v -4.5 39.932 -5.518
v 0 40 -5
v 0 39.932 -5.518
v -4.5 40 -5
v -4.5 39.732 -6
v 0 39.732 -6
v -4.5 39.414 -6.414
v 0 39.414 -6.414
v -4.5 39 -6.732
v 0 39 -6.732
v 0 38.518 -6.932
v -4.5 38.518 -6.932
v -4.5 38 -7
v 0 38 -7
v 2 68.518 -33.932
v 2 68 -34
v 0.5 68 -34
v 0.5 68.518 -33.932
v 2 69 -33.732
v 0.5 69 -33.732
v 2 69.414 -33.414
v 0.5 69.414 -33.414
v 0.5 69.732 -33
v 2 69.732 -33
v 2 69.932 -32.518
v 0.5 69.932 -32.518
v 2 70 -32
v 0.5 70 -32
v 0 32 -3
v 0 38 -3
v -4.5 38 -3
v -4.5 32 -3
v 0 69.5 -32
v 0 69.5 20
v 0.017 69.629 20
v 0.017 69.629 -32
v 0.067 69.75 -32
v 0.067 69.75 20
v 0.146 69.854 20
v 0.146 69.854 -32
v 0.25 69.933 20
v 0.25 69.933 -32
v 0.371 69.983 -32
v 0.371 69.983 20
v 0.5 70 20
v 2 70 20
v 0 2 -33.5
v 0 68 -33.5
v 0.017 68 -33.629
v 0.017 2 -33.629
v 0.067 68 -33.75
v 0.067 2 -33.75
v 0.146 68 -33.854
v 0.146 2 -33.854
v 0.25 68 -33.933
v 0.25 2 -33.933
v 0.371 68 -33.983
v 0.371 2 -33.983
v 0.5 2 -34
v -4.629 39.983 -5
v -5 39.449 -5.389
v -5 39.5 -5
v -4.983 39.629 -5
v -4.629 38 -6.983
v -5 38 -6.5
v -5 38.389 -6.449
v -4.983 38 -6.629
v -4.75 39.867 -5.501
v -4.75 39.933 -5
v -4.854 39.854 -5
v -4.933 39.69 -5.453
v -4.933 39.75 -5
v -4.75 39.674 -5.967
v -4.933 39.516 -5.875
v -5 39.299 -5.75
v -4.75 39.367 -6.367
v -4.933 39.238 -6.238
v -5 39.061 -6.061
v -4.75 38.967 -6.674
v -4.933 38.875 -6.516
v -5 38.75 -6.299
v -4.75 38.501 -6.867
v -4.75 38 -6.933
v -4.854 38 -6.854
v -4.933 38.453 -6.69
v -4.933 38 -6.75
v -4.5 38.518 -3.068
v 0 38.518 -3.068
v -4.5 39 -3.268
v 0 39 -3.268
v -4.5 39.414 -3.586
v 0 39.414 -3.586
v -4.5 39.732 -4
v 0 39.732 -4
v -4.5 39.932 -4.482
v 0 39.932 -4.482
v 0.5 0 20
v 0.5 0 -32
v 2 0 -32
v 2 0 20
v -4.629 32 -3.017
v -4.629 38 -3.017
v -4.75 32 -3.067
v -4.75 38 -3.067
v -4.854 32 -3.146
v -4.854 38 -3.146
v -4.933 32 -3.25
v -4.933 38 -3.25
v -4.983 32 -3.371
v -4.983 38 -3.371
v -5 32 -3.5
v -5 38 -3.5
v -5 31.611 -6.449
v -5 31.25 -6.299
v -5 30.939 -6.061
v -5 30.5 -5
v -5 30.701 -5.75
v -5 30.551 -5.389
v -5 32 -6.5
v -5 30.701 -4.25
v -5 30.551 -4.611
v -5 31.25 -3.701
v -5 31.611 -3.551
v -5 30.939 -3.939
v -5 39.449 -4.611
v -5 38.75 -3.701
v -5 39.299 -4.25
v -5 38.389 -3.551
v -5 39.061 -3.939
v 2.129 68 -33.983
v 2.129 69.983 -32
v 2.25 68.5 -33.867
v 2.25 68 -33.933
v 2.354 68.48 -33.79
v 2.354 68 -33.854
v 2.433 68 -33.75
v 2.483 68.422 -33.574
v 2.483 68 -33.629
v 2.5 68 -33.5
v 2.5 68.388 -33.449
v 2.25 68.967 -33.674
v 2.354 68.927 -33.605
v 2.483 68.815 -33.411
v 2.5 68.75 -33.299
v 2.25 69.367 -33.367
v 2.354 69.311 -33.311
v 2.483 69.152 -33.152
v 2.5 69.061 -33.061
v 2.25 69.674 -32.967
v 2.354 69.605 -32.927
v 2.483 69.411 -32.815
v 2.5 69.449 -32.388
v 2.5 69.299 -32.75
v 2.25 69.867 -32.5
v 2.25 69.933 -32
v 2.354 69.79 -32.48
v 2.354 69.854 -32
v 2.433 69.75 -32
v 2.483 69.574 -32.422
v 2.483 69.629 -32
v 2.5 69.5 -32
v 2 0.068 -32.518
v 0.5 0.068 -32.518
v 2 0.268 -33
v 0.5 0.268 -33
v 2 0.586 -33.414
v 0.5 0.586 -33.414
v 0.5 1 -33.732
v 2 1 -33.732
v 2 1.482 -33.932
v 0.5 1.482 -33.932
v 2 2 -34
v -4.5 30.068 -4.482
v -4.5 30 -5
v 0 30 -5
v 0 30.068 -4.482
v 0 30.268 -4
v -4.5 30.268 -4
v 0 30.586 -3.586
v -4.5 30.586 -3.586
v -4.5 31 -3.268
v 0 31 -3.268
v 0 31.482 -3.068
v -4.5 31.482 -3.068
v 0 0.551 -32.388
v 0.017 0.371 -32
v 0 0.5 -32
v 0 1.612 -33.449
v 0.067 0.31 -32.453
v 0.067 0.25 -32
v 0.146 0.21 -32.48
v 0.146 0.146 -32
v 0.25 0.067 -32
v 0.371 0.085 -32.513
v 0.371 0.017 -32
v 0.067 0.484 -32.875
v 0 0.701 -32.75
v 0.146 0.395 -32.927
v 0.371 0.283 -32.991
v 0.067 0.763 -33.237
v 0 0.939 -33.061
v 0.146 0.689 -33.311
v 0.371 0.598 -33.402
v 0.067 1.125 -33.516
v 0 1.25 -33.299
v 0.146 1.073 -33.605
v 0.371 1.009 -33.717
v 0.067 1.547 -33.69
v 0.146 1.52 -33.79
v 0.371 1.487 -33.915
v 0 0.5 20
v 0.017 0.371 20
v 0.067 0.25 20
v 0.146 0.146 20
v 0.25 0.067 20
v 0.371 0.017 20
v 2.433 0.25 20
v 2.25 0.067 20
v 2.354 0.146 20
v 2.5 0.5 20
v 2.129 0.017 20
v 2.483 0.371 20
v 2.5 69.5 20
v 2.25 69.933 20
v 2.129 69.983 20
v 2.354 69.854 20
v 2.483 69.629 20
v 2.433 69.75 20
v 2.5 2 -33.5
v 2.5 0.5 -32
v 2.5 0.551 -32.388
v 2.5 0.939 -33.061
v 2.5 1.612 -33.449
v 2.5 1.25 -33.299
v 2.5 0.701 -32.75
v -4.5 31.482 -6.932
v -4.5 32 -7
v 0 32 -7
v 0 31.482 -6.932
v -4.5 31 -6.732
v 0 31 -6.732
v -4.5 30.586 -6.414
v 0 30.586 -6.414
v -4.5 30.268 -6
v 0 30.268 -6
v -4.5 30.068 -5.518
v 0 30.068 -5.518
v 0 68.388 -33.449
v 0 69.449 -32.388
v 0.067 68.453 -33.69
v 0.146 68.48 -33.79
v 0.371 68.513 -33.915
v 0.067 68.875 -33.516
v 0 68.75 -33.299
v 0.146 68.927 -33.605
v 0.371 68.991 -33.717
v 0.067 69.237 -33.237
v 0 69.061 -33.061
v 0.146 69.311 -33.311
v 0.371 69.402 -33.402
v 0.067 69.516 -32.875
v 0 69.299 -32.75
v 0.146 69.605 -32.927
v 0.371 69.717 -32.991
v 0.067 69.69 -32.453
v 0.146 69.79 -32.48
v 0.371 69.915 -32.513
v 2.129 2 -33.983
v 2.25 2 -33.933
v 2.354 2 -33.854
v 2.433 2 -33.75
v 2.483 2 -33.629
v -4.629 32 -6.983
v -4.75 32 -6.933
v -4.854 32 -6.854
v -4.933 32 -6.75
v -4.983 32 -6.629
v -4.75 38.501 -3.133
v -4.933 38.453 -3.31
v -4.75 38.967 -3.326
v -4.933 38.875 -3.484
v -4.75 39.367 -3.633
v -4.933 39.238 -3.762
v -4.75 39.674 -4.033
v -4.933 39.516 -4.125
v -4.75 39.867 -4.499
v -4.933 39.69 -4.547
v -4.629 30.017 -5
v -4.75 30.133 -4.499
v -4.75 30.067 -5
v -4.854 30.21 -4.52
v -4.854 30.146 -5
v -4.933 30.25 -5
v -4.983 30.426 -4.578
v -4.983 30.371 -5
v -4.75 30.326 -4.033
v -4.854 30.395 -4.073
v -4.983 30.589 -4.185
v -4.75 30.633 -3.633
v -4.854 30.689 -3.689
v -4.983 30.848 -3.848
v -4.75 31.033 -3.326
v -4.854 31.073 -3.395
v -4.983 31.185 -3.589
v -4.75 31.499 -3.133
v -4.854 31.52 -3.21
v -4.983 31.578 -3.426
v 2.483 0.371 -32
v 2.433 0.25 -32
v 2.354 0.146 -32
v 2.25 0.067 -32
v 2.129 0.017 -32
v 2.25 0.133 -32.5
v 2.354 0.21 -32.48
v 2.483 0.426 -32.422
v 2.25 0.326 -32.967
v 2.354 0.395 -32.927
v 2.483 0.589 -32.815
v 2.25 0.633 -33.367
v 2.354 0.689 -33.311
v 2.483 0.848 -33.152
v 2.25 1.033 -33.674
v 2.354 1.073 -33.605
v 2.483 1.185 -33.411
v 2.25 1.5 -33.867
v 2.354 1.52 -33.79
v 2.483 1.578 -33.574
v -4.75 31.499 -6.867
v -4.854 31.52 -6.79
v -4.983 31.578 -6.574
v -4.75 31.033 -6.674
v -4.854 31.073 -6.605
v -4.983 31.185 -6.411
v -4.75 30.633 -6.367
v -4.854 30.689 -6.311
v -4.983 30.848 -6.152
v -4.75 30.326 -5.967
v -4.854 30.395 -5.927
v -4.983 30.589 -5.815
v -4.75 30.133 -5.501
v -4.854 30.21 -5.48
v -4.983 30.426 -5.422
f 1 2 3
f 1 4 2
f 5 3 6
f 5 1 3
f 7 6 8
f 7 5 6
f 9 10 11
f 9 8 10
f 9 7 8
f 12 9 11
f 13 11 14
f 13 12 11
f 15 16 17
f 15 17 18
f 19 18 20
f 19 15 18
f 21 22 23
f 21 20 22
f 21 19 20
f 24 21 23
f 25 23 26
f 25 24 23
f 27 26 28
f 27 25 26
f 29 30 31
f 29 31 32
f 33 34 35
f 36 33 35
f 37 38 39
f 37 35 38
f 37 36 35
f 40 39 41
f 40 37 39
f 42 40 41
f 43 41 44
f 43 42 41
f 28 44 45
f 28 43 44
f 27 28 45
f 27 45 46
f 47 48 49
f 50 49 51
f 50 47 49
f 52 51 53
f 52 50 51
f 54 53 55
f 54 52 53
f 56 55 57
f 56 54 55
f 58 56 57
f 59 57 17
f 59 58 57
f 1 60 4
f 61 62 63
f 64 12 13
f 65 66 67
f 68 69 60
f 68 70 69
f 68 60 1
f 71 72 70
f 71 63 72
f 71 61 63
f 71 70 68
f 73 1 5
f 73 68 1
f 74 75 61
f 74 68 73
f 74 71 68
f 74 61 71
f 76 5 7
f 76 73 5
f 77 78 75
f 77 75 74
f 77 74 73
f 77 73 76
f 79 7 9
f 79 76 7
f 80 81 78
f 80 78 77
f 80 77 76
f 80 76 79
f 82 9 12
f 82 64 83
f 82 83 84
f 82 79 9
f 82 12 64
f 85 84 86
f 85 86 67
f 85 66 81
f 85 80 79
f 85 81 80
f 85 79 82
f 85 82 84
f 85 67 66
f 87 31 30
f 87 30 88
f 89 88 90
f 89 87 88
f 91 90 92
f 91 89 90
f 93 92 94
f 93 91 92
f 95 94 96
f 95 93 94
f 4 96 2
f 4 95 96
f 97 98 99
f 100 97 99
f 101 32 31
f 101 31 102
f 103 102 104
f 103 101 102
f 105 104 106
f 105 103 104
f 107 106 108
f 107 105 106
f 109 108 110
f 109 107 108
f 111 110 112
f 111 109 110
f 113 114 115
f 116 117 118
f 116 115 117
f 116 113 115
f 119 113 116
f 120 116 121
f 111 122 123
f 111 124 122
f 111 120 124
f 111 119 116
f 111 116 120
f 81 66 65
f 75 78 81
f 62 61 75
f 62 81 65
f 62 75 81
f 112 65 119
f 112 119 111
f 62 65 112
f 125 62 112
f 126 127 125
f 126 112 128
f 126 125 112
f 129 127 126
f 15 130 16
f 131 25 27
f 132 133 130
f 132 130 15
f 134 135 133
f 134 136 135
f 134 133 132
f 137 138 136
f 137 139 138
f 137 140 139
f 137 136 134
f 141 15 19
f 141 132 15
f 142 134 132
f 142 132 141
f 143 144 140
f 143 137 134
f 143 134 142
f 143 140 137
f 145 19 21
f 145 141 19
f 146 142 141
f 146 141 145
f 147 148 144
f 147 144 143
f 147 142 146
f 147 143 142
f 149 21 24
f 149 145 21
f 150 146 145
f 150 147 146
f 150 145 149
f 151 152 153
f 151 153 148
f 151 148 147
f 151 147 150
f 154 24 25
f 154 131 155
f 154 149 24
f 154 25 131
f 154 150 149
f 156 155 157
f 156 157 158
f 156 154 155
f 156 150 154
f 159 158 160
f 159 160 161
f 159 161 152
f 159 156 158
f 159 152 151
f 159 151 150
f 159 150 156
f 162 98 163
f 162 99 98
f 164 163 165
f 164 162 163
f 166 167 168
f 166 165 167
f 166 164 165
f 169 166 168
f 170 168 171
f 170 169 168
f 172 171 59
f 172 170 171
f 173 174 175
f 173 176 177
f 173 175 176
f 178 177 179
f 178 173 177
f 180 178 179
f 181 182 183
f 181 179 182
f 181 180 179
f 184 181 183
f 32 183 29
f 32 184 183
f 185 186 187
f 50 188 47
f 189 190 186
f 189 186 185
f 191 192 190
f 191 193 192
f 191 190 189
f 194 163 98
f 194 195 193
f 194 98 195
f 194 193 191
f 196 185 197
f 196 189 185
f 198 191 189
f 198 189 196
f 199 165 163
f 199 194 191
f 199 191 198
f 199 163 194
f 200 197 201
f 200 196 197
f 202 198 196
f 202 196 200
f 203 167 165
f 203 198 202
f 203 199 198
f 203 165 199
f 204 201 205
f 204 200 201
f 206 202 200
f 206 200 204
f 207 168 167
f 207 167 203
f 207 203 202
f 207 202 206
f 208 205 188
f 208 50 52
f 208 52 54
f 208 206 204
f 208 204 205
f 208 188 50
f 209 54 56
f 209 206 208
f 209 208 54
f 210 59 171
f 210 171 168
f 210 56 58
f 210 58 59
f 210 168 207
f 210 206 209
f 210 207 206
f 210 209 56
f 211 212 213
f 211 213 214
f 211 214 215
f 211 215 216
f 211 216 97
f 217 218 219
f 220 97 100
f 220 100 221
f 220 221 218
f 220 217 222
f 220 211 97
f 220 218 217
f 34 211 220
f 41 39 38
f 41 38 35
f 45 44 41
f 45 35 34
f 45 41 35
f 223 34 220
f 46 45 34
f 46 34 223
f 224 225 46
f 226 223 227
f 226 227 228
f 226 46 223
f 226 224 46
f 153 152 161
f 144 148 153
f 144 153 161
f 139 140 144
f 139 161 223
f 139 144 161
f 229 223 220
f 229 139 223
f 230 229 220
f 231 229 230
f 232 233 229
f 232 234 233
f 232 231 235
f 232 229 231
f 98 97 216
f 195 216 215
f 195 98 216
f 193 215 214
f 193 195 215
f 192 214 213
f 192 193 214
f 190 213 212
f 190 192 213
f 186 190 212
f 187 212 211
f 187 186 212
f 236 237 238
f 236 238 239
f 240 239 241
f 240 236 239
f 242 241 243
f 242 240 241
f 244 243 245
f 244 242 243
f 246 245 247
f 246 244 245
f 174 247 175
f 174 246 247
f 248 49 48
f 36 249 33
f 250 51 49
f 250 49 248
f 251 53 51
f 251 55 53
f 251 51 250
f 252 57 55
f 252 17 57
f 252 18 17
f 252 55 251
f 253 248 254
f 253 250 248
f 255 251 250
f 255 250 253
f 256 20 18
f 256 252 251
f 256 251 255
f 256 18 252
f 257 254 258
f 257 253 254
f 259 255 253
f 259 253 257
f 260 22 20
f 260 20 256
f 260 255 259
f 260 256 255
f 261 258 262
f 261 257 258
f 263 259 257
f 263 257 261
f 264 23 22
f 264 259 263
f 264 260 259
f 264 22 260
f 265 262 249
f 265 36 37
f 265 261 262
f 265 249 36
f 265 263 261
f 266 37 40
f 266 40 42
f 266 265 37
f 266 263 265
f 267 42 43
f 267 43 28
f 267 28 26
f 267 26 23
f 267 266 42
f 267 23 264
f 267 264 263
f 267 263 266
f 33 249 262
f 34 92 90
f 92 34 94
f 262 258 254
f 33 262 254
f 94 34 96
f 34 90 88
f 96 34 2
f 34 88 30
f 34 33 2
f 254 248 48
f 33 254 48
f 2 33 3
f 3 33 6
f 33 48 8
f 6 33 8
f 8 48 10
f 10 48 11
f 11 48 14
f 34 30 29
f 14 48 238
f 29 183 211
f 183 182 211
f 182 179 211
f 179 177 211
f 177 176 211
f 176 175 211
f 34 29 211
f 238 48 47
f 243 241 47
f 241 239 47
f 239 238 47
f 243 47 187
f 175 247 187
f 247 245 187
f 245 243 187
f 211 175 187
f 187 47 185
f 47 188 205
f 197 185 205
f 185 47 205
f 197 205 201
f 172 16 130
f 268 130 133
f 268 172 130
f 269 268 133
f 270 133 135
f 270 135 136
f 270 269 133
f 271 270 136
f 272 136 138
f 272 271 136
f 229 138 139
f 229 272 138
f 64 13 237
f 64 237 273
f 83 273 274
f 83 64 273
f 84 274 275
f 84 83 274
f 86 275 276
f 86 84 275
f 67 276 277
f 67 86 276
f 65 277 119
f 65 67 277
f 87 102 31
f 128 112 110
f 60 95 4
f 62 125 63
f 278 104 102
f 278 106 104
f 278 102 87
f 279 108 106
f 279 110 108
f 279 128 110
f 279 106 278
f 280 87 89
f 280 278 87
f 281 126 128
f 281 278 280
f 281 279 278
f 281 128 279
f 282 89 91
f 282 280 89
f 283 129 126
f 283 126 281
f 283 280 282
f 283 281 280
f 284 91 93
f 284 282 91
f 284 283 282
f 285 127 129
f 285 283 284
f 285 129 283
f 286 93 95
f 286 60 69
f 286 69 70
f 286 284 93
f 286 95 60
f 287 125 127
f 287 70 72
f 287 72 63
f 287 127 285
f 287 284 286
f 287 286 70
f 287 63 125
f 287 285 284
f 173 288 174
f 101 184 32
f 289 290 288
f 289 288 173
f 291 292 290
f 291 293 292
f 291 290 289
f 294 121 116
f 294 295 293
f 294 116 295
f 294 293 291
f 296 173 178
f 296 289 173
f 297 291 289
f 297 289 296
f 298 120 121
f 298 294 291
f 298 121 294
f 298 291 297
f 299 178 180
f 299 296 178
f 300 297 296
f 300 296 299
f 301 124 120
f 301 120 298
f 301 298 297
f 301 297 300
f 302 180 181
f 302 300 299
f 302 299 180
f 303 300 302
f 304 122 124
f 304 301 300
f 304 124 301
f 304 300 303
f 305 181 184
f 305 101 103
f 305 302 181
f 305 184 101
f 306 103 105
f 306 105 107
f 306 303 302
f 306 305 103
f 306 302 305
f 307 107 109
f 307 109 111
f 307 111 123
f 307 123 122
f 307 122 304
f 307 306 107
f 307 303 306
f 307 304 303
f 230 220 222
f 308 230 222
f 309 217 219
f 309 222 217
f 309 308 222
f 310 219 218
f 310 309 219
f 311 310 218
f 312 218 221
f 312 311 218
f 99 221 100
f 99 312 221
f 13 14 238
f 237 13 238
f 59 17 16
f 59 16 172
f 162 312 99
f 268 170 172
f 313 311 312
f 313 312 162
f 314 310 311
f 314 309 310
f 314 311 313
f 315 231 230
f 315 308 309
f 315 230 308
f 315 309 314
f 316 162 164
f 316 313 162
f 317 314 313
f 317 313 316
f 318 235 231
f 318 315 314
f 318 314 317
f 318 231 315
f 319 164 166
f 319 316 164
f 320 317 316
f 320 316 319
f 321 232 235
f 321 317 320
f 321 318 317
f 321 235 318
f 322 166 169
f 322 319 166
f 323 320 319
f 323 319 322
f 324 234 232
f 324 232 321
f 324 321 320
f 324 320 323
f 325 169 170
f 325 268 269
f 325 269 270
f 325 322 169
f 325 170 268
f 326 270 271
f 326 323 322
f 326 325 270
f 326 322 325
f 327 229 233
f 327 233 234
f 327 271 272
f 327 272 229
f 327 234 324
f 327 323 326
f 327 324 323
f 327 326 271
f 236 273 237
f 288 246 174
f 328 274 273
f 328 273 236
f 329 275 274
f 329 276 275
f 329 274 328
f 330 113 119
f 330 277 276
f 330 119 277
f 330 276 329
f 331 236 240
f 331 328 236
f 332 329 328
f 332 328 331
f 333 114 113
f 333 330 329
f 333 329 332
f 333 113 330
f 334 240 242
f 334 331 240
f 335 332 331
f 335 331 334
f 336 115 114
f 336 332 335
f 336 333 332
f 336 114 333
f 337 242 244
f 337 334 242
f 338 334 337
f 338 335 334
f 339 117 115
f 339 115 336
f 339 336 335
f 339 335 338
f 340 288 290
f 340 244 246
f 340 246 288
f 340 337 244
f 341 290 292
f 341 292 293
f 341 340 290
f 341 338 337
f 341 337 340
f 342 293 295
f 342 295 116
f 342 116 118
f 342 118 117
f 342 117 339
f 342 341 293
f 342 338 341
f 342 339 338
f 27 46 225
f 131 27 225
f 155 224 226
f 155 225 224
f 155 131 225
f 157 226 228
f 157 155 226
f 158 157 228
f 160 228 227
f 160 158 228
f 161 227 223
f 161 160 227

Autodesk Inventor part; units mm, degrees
ref_plane "YZ Plane" through (0, 0, 0) normal (1, 0, 0) x (0, 1, 0)
ref_plane "XZ Plane" through (0, 0, 0) normal (0, 1, 0) x (-1, 0, 0)
ref_plane "XY Plane" through (0, 0, 0) normal (0, 0, 1) x (1, 0, 0)
sketch "Sketch1" plane through (0, 0, 0) normal (1, 0, 0) x (0, 1, 0)
  line L0 (0, 0) -> (70, 0)
  line L1 (70, 0) -> (70, -34)
  line L2 (70, -34) -> (0, -34)
  line L3 (0, -34) -> (0, 0)
  dimension "d0" = 34
  dimension "d1" = 70
extrude "Extrusion1" add sketch "Sketch1" along normal blind 2.5
fillet "Fillet1" radius 2 2 edges at (1.25, 70, -34) (1.25, 0, -34)
fillet "Fillet2" radius 0.5 10 edges at (2.5, 69.4142, -33.4142) (2.5, 70, -16) (2.5, 0.5858, -33.4142) (2.5, 0, -16) (2.5, 35, -34) (0, 0.5858, -33.4142) (0, 35, -34) (0, 69.4142, -33.4142) (0, 70, -16) (0, 0, -16)
sketch "Sketch2" plane through (0, 0, 0) normal (-1, 0, 0) x (0, 0, 1)
  line L0 (0, 69.5) -> (0, 0.5) projected
  line L1 (7, 40) -> (-7, 40)
  line L2 (-7, 40) -> (-7, 30)
  line L3 (-7, 30) -> (7, 30)
  line L4 (7, 30) -> (7, 40)
  line L5 (0, 69.5) -> (0, 0.5) projected
  line L6 (7, 40) -> (-7, 30) construction
  line L7 (-7, 40) -> (7, 30) construction
  line L8 (-3, 40) -> (-3, 30)
  point P0 (0, 0)
  point P1 (0, 35)
  point P2 (-7, 35)
  point P3 (-3, 35)
  dimension "d6" = 10
  dimension "d7" = 14
  dimension "d8" = 4
extrude "Extrusion2" add sketch "Sketch2" along normal blind 5 contours L8 L3 L2 L1
fillet "Fillet3" radius 2 4 edges at (-2.5, 40, -3) (-2.5, 30, -3) (-2.5, 30, -7) (-2.5, 40, -7)
fillet "Fillet4" radius 0.5 4 edges at (-5, 30.5856, -3.5856) (-5, 35, -3) (-5, 39.4144, -3.5856) (-5, 35, -7)
sketch "Sketch3" plane through (0, 0.5, 0) normal (0, 0, 1) x (1, 0, 0)
  arc A0 (2.5, 69) -> (2, 69.5) centre (2, 69) ccw projected
  arc A1 (0.5, 69.5) -> (0, 69) centre (0.5, 69) ccw projected
  arc A2 (0.5, 69.5) -> (0, 69) centre (0.5, 69) ccw projected
  line L0 (0, 69) -> (0, 0) projected
  arc A3 (0, 0) -> (0.5, -0.5) centre (0.5, 0) ccw projected
  line L1 (0.5, -0.5) -> (2, -0.5) projected
  arc A4 (2, -0.5) -> (2.5, 0) centre (2, 0) ccw projected
  line L2 (2.5, 69) -> (2.5, 0) projected
  arc A5 (2.5, 69) -> (2, 69.5) centre (2, 69) ccw projected
  line L3 (0.5, 69.5) -> (2, 69.5) projected
  point P0 (0, -0.5)
  point P1 (0, 69)
extrude "Extrusion3" add sketch "Sketch3" along normal blind 20
properties part number "tapa de caja de servomotores"
